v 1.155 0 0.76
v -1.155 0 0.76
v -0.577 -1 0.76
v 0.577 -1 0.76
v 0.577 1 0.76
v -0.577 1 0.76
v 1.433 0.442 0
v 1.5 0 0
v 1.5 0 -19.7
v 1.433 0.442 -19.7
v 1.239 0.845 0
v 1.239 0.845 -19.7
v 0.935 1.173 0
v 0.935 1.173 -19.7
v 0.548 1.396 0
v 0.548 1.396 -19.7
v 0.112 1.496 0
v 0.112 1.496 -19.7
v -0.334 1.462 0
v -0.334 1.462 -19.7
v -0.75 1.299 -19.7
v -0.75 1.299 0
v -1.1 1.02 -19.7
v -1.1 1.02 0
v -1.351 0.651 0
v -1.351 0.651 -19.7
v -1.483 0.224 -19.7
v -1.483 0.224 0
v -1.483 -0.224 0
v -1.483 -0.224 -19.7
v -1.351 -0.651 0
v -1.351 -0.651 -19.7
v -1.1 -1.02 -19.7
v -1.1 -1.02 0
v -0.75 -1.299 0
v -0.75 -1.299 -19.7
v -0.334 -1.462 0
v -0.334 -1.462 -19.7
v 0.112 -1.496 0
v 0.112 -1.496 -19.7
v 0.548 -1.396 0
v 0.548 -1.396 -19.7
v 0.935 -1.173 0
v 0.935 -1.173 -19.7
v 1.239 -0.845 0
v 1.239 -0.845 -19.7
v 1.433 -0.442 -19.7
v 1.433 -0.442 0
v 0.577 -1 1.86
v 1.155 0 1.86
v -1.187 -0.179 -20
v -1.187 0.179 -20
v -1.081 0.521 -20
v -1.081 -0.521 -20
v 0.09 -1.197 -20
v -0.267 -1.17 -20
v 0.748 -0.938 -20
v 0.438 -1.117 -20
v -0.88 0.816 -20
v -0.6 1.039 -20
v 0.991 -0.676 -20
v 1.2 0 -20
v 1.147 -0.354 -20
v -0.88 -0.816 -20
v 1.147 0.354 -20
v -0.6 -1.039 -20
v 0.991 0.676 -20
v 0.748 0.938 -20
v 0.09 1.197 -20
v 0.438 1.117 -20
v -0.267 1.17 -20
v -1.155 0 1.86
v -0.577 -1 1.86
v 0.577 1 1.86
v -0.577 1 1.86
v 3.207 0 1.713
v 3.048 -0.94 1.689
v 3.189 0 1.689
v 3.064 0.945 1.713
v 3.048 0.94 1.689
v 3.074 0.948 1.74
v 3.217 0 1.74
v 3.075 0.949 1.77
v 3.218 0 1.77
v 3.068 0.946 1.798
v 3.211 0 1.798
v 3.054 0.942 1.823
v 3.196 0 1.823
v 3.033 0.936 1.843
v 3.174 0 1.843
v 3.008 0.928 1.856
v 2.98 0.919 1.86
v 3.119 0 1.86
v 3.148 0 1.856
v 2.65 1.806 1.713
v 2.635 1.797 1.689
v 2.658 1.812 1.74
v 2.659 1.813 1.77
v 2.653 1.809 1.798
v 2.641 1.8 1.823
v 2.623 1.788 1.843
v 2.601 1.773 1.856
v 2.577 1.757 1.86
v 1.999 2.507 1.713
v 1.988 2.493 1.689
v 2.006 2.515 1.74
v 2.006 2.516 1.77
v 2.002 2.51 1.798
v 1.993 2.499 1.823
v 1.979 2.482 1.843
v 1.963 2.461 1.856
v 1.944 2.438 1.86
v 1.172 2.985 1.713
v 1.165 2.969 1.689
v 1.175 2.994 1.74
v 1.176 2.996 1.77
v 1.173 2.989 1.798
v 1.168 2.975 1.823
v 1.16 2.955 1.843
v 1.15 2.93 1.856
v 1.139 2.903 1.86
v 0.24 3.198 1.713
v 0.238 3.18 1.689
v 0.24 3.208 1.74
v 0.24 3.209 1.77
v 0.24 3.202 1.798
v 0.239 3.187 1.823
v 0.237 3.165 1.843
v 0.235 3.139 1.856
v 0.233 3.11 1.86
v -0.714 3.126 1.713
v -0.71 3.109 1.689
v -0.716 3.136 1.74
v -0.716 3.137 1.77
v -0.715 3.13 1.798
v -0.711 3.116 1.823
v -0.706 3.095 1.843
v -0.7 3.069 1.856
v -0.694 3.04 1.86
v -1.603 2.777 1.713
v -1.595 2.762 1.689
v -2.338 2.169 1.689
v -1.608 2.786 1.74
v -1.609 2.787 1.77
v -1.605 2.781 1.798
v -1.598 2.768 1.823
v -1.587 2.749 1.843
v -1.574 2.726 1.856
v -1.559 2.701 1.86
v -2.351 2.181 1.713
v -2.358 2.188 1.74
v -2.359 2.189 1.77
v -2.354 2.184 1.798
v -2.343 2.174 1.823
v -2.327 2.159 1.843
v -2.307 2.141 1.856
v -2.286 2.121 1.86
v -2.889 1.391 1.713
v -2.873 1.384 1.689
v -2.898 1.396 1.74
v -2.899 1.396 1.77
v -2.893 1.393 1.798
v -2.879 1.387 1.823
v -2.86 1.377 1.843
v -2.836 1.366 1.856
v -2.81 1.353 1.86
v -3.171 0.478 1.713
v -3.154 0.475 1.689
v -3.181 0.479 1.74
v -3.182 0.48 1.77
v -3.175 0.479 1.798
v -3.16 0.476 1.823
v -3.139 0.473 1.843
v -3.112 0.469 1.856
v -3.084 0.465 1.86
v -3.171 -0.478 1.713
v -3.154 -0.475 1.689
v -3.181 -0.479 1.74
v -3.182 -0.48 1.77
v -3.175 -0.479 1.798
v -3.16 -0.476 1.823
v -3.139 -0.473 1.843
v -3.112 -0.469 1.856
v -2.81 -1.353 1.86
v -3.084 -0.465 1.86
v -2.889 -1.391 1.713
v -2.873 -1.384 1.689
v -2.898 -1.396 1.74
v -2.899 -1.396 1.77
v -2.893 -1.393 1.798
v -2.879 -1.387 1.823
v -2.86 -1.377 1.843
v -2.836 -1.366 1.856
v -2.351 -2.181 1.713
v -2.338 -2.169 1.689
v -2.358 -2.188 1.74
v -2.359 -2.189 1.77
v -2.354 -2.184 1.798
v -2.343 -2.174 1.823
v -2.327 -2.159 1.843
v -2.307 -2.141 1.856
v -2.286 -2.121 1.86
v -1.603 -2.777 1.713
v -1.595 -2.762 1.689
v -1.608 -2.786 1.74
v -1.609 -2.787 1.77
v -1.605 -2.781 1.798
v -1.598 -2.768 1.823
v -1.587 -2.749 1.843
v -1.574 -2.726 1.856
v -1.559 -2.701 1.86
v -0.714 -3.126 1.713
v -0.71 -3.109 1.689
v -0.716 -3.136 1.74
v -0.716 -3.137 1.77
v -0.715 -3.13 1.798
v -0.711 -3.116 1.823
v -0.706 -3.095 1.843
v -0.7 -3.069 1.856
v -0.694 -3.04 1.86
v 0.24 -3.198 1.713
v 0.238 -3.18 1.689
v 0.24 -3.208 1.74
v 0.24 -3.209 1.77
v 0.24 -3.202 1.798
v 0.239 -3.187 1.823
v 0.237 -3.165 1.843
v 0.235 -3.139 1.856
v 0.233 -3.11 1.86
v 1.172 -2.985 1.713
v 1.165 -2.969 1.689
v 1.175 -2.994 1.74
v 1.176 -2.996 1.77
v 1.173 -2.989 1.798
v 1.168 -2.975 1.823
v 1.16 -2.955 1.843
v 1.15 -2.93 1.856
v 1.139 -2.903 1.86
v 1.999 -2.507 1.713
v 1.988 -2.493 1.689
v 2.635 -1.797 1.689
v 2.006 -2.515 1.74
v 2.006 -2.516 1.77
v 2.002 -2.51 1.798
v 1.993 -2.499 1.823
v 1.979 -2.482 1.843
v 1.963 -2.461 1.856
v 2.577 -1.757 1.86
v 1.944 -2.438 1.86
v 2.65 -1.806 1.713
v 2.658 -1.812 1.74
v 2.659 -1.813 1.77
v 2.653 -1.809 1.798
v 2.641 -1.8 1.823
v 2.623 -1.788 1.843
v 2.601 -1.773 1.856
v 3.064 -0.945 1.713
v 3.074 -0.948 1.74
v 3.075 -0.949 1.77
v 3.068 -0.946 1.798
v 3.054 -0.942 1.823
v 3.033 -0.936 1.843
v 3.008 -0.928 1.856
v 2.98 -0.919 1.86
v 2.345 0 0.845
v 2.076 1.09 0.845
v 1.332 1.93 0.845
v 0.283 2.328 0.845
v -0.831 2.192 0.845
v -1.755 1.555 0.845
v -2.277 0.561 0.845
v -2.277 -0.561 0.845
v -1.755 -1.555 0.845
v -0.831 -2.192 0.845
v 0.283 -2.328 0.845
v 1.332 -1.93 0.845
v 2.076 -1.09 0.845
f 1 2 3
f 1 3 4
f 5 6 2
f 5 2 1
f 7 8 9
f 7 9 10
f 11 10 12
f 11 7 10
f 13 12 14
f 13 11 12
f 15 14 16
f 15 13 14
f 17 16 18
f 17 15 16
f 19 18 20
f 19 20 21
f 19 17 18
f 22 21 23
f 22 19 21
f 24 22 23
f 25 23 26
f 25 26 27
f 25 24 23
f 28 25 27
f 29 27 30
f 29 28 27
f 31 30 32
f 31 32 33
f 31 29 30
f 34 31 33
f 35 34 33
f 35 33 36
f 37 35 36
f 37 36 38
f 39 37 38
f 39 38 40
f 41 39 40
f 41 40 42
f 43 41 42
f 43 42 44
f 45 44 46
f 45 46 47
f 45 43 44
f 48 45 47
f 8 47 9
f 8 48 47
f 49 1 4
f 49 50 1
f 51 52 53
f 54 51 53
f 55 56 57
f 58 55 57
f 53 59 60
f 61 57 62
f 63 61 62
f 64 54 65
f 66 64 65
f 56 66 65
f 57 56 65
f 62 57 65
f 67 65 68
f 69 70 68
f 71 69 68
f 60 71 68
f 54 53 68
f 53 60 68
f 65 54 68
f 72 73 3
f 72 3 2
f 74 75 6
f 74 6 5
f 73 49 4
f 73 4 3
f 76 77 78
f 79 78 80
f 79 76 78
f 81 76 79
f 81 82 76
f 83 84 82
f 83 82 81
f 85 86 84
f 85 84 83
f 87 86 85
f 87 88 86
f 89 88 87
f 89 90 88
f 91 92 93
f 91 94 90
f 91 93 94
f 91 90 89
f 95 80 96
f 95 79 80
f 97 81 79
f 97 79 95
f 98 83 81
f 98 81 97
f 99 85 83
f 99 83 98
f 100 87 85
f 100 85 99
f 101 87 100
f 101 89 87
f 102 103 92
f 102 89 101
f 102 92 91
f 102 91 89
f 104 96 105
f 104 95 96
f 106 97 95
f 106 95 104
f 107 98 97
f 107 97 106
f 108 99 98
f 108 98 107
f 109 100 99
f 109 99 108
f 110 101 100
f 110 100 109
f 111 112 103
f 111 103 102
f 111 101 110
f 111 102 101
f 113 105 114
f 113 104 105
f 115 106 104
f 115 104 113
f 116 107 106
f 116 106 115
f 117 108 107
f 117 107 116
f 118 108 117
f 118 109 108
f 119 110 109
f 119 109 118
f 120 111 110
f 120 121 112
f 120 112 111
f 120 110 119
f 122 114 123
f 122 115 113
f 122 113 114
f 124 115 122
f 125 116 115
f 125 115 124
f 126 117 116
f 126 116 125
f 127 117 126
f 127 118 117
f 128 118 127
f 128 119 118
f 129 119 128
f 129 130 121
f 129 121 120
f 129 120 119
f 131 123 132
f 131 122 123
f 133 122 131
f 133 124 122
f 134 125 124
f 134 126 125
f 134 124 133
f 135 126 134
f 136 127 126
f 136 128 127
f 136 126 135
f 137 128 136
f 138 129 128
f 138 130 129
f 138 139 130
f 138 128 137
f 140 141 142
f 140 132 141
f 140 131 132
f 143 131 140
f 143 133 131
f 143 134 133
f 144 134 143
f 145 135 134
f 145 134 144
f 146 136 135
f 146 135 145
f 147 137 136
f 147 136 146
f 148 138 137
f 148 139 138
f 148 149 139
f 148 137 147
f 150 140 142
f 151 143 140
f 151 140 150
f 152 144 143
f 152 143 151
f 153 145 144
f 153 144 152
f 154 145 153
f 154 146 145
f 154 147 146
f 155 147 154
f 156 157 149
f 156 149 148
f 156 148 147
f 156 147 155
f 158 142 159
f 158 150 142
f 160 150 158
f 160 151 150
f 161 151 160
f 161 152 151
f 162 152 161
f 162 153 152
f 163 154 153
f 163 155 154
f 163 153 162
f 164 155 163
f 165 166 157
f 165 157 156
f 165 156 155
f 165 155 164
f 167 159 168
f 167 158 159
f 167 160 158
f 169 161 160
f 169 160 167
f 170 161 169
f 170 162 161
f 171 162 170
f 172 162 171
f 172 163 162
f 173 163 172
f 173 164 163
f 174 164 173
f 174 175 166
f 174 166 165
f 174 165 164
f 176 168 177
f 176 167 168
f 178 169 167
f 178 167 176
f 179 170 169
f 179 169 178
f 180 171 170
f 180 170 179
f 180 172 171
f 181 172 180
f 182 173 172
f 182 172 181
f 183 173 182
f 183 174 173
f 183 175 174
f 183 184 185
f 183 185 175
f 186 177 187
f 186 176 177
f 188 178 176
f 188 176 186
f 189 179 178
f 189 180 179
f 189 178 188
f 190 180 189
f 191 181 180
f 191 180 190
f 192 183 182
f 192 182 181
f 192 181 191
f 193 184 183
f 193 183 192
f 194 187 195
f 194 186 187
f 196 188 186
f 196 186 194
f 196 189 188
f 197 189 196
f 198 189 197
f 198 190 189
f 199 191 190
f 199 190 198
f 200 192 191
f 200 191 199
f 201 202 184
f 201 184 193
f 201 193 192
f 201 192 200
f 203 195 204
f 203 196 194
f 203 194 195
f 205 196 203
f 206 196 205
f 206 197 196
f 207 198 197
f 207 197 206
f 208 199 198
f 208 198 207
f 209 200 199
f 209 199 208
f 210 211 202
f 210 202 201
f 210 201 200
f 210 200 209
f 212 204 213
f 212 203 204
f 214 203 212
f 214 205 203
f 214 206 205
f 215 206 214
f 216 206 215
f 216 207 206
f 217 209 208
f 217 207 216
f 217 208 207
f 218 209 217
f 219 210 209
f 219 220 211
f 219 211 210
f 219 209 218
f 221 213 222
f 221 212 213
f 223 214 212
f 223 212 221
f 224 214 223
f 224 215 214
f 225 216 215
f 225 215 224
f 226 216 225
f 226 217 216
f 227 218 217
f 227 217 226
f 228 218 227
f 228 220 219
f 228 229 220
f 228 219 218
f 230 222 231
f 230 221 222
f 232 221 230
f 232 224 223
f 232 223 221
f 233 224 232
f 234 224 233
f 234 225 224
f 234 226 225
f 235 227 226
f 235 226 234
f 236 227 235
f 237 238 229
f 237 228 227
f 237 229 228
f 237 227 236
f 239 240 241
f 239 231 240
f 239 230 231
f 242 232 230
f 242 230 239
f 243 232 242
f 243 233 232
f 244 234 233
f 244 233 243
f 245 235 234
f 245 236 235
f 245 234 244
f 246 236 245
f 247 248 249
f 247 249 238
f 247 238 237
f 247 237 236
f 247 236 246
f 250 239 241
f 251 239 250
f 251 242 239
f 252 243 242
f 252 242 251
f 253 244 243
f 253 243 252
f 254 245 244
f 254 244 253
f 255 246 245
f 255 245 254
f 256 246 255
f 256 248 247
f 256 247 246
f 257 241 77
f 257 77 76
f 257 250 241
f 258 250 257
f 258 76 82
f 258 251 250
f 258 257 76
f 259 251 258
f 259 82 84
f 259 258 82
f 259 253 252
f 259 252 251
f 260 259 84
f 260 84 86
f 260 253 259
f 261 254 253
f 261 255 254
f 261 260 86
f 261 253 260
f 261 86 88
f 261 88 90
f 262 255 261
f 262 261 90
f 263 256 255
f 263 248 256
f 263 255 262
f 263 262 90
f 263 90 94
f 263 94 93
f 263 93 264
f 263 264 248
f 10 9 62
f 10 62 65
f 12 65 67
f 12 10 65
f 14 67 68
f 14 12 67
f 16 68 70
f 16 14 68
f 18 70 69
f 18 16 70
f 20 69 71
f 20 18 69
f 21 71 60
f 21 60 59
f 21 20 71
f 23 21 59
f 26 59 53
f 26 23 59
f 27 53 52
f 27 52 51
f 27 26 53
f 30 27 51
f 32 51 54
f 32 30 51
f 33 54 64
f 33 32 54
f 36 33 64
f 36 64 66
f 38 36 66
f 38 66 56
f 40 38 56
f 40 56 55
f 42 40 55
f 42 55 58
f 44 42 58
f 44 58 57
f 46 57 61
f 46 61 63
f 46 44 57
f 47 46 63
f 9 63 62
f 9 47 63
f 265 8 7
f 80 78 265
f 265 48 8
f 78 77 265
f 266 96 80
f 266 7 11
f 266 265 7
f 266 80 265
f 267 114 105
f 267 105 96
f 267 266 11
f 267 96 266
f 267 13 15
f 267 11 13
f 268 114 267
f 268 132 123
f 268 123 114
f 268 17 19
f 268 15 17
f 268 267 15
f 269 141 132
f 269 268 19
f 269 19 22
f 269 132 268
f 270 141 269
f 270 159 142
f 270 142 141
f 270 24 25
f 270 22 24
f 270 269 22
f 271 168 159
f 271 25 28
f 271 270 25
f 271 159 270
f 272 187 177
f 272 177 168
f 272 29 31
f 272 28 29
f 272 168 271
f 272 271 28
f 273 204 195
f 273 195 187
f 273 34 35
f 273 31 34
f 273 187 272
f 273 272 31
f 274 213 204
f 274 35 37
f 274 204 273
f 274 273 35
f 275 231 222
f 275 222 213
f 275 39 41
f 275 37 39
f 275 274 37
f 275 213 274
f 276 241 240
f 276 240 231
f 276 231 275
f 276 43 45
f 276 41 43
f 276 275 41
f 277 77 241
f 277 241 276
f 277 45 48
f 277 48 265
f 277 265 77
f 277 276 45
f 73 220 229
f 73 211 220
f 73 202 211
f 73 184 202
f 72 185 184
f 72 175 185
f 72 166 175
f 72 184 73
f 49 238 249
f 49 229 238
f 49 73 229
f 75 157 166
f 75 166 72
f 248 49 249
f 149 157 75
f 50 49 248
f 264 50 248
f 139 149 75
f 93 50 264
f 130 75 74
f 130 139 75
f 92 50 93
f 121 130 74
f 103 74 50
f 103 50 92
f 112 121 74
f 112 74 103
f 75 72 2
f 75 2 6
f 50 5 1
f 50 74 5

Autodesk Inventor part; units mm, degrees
ref_plane "YZ Plane" through (0, 0, 0) normal (1, 0, 0) x (0, 1, 0)
ref_plane "XZ Plane" through (0, 0, 0) normal (0, 1, 0) x (-1, 0, 0)
ref_plane "XY Plane" through (0, 0, 0) normal (0, 0, 1) x (1, 0, 0)
sketch "Sketch2" plane through (0, 0, 0) normal (0, 0, 1) x (1, 0, 0)
  circle A0 centre (0, 0) radius 1.5
  dimension "Diameter" = 3
extrude "Extrusion1" add sketch "Sketch2" against normal blind 20
sketch "Sketch3" plane through (0, 0, 0) normal (0, 0, 1) x (1, 0, 0)
  circle A0 centre (0, 0) radius 1.5 projected
extrude "Extrusion2" add sketch "Sketch3" along normal blind 1.86 draft 45
sketch "Sketch4" plane through (0, 0, 1.86) normal (0, 0, 1) x (1, 0, 0)
  circle A0 centre (0, 0) radius 3.36 projected
  line L0 (0.5774, 1) -> (1.1547, 0)
  line L1 (1.1547, 0) -> (0.5774, -1)
  line L2 (0.5774, -1) -> (-0.5774, -1)
  line L3 (-0.5774, -1) -> (-1.1547, 0)
  line L4 (-1.1547, 0) -> (-0.5774, 1)
  line L5 (-0.5774, 1) -> (0.5774, 1)
  line L6 (0, 0) -> (1.1547, 0) construction
  dimension "Hex_Width" = 2
extrude "Extrusion3" cut sketch "Sketch4" against normal blind 1.1 contours L0 L1 L2 L3 L4 L5
thread "Thread1" size "M3x0.5" class "6g" standard "ANSI Metric M Profile-Short lst" length 20
chamfer "Chamfer1" distance 0.3 angle 45 1 edges at (-1.5, 0, -20)
fillet "Fillet1" radius 0.1 1 edges at (-3.36, 0, 1.86)
equation "\"Thread_Length\" = Length1"
equation "\"Length1\" = 20"
properties part number "SCREW,FLAT-HD,P,10_9,M03X0_50X20MM" material "Steel, MS"
